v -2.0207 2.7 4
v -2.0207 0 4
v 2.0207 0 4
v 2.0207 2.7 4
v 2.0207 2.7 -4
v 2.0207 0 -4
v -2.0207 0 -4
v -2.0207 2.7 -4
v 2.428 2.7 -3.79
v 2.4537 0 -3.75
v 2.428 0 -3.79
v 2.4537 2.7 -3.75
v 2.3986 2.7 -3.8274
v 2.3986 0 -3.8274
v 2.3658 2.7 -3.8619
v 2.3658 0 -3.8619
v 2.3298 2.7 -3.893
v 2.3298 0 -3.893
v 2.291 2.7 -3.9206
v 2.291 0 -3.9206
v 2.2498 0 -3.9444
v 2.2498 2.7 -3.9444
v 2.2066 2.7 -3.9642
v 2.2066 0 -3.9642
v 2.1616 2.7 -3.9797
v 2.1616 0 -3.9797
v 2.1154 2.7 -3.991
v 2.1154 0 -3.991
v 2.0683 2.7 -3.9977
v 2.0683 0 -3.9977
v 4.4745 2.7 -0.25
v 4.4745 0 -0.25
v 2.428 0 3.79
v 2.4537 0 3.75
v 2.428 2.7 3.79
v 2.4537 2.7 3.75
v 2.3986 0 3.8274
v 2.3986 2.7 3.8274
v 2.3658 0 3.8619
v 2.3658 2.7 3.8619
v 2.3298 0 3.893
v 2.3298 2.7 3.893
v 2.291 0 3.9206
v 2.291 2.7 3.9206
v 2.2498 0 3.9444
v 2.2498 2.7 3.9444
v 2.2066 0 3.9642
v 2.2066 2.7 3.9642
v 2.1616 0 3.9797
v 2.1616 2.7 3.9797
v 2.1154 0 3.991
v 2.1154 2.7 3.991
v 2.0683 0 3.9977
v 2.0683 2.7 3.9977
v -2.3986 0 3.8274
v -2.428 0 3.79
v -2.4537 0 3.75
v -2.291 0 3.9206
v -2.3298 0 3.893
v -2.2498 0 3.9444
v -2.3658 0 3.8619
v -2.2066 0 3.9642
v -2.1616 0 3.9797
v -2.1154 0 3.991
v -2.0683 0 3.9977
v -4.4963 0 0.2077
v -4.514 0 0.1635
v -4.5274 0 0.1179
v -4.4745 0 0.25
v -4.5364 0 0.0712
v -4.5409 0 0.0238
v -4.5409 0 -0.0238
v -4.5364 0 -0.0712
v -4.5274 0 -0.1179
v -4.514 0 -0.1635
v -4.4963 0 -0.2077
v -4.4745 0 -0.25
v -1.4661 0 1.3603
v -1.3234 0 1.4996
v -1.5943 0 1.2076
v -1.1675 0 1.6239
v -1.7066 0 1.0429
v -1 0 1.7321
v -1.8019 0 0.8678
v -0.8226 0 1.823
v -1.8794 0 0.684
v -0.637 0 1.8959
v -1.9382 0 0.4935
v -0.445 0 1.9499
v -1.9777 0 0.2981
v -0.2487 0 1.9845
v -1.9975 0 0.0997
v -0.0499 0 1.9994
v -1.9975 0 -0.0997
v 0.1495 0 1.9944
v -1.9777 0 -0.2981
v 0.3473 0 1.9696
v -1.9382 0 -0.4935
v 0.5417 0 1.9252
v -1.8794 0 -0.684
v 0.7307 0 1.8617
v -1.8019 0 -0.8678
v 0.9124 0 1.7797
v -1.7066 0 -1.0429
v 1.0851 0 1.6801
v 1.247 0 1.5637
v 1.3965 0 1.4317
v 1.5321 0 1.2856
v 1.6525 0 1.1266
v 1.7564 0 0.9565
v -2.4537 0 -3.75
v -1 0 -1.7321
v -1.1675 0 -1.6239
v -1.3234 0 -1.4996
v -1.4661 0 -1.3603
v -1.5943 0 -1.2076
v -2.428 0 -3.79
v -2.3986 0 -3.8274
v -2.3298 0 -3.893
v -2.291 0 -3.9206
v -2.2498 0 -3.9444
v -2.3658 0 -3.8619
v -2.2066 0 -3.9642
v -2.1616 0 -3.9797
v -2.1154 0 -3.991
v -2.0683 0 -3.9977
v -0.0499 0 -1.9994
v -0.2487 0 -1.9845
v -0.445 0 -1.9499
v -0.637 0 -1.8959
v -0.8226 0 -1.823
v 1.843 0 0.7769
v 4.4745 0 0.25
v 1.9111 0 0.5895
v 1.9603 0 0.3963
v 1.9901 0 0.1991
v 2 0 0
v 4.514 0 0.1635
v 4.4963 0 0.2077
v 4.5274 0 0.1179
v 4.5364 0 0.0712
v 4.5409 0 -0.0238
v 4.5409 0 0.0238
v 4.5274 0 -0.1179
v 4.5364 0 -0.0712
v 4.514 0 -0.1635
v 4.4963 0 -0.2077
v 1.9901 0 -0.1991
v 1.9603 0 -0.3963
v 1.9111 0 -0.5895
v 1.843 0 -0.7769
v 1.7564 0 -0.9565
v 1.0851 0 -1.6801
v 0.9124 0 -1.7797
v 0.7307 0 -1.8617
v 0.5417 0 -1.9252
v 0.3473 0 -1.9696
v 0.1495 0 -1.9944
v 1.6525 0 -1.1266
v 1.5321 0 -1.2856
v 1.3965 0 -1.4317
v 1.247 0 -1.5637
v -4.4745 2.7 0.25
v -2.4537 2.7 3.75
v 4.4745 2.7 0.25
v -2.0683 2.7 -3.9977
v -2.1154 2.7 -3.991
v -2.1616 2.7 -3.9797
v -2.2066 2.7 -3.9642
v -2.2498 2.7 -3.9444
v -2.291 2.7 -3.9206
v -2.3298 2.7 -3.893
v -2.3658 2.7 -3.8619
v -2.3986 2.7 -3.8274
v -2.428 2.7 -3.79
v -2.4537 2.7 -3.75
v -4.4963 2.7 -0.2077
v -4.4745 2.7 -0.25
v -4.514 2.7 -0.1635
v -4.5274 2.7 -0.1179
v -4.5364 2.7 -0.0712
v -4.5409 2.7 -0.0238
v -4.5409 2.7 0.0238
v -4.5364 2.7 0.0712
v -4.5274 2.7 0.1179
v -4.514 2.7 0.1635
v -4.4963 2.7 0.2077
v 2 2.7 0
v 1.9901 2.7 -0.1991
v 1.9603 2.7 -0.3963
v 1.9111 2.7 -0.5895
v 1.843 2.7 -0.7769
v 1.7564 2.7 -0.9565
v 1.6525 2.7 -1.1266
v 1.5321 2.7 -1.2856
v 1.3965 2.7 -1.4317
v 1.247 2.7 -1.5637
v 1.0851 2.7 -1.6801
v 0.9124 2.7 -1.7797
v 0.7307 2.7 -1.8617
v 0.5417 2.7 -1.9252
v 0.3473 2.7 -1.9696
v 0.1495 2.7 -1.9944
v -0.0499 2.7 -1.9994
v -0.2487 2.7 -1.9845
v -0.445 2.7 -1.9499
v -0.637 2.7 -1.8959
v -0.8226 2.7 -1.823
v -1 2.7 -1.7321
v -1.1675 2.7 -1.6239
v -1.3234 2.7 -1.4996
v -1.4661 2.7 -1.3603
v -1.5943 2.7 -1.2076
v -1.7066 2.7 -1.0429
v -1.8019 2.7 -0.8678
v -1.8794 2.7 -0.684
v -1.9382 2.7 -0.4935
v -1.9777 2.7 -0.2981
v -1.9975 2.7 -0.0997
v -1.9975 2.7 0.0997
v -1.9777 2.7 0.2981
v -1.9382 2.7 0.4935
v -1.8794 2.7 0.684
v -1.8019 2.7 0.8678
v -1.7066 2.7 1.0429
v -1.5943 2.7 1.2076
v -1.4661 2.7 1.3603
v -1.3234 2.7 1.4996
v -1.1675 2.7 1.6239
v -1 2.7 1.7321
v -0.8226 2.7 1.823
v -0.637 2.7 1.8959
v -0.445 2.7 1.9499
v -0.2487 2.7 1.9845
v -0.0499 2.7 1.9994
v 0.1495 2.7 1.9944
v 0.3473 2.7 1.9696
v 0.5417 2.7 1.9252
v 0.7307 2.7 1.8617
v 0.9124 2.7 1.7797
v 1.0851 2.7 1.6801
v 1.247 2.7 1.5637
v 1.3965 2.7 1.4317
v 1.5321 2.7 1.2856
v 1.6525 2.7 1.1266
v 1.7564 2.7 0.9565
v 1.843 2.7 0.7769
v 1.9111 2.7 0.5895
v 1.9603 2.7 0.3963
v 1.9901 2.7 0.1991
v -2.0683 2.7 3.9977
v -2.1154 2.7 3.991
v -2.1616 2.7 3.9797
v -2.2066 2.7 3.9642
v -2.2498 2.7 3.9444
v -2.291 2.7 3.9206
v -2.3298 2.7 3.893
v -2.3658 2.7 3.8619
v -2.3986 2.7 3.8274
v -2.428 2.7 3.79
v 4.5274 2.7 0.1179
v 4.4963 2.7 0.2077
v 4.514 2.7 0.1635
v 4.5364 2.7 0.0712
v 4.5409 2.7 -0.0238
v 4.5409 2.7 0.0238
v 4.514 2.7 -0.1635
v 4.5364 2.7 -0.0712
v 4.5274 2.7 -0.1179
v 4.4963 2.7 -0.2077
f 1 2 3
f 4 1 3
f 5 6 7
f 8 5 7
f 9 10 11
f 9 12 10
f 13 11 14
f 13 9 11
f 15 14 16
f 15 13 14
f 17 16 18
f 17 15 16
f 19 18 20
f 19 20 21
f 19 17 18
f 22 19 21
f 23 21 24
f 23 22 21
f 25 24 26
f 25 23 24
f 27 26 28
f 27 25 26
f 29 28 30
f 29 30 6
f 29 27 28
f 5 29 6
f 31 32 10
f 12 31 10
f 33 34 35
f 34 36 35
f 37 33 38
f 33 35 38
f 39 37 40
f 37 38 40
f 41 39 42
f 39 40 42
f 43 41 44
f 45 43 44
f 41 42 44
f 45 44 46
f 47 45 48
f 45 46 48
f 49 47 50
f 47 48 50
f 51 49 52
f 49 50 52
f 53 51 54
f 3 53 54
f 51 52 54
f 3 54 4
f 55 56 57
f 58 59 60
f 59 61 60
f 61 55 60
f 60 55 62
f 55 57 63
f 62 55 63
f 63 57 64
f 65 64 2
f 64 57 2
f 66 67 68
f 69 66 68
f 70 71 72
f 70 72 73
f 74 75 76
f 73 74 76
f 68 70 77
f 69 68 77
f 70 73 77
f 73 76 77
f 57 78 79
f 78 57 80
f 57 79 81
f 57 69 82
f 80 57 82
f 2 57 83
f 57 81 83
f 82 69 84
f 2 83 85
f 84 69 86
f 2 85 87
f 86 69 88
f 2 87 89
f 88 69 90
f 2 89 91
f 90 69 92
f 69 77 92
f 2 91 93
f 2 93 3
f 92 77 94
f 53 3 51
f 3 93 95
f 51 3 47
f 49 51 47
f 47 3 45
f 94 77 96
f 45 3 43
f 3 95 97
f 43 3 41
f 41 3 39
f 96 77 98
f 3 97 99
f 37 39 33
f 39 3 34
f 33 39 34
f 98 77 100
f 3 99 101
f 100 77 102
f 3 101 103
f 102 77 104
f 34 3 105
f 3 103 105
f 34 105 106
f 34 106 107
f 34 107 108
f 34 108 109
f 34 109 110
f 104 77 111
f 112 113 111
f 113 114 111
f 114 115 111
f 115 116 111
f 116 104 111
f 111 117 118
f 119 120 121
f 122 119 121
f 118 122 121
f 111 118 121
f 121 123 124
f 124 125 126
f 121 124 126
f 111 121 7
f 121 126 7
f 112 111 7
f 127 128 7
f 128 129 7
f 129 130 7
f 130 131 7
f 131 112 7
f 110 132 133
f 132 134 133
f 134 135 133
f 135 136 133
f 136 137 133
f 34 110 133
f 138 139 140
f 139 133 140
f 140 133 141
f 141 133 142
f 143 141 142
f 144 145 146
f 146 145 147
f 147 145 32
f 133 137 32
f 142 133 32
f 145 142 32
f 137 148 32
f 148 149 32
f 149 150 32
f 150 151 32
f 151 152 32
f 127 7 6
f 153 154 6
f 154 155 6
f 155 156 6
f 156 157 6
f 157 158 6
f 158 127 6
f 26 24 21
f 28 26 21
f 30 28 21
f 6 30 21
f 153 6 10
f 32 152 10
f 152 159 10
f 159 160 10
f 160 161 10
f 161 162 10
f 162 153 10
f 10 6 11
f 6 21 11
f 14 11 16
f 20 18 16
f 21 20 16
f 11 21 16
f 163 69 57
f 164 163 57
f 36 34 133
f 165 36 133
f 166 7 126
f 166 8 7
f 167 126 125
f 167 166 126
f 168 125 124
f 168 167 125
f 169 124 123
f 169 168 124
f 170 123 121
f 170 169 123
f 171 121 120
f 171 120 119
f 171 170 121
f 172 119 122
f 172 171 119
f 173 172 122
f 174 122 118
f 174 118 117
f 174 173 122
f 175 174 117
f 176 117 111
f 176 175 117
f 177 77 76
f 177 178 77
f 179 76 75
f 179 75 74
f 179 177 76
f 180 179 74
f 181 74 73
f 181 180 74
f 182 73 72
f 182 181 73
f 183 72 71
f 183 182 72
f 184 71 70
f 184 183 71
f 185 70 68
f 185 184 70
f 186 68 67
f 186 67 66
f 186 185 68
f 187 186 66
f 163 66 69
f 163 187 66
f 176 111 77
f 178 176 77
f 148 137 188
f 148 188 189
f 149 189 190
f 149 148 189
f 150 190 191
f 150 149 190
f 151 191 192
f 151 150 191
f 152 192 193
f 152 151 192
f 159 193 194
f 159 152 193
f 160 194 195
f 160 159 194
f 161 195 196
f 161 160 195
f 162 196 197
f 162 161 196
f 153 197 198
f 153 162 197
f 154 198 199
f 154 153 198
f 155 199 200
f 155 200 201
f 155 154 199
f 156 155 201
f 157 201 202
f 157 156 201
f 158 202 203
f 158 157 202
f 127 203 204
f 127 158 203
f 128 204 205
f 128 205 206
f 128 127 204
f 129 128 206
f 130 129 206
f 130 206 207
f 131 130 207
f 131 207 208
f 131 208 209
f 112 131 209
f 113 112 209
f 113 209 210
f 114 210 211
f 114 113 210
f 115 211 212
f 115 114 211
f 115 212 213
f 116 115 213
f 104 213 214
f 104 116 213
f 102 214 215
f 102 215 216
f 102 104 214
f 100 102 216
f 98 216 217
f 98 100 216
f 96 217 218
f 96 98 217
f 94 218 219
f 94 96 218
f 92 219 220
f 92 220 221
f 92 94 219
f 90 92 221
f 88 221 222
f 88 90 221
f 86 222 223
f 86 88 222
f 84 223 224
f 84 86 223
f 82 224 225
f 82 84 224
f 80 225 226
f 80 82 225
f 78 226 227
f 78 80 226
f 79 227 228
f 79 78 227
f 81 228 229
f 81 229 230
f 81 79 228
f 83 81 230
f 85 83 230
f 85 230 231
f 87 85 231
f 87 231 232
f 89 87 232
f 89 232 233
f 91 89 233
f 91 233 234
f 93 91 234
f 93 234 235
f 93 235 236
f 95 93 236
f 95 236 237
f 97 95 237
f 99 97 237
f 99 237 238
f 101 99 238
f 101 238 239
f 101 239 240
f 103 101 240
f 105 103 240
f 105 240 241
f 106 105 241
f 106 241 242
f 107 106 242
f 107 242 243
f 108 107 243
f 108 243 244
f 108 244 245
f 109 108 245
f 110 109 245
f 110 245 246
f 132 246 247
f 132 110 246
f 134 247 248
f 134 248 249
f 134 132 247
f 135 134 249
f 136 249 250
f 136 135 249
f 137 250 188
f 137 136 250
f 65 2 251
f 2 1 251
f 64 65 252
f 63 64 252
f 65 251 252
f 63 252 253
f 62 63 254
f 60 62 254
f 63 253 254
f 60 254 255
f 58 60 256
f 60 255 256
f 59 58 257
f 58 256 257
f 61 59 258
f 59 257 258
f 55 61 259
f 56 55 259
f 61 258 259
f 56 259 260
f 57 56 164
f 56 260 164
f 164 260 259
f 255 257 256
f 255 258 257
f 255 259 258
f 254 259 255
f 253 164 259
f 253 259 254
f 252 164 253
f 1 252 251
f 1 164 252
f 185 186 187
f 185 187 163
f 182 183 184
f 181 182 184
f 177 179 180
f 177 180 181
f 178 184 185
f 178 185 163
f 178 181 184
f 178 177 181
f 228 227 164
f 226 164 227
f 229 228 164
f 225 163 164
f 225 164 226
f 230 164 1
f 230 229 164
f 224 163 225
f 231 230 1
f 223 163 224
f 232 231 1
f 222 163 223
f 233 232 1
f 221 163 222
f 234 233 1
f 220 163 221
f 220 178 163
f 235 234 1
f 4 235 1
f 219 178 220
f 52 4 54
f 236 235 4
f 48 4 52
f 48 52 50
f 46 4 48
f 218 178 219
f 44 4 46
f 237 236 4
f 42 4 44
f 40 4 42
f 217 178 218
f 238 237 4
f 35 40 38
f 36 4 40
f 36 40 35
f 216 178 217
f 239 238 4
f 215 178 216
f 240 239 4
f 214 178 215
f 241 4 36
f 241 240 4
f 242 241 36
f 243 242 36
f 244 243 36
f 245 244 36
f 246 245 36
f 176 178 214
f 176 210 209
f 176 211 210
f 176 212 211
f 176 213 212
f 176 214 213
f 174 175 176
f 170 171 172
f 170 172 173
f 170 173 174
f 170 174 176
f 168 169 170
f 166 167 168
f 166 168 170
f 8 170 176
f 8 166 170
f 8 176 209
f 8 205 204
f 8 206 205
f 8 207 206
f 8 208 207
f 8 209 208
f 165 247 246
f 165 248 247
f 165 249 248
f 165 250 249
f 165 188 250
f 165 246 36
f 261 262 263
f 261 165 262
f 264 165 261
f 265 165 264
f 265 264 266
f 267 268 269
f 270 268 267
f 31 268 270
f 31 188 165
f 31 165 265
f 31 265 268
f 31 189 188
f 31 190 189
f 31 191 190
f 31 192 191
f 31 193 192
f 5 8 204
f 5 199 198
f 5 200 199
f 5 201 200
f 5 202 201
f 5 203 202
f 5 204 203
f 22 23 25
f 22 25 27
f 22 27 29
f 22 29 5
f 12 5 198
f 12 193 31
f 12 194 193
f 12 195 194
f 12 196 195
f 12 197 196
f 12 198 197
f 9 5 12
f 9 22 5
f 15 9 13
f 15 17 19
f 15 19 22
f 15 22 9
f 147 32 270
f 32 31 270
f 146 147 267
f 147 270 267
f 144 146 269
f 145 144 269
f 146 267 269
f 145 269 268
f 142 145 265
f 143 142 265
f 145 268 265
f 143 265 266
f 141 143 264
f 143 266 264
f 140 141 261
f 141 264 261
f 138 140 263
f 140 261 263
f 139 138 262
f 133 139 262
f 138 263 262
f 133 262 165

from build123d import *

# Parameters (mm, degrees)
SKETCH_1_R      = 2
EXTRUDE_1_DEPTH = 2.7
FILLET_1_R      = 0.5


with BuildPart() as part:
    # Эскиз1 → Бобышка-Вытянуть1 (new body)
    with BuildSketch(Plane(origin=(0, 0, 0), x_dir=(1, 0, 0), z_dir=(0, 1, 0))):
        Polygon((4.618802154, 0), (2.309401077, 4), (-2.309401077, 4), (-4.618802154, 0), (-2.309401077, -4), (2.309401077, -4), align=None)
        Circle(SKETCH_1_R, mode=Mode.SUBTRACT)
    extrude(amount=EXTRUDE_1_DEPTH)

    # Скругление1
    fillet_1_edges = [part.edges().sort_by_distance(p)[0] for p in [
        (2.309401077, 1.35, 4),
        (-2.309401077, 1.35, 4),
        (-4.618802154, 1.35, 0),
        (-2.309401077, 1.35, -4),
        (2.309401077, 1.35, -4),
        (4.618802154, 1.35, 0),
    ]]
    fillet(fillet_1_edges, radius=FILLET_1_R)


solid = part.part
